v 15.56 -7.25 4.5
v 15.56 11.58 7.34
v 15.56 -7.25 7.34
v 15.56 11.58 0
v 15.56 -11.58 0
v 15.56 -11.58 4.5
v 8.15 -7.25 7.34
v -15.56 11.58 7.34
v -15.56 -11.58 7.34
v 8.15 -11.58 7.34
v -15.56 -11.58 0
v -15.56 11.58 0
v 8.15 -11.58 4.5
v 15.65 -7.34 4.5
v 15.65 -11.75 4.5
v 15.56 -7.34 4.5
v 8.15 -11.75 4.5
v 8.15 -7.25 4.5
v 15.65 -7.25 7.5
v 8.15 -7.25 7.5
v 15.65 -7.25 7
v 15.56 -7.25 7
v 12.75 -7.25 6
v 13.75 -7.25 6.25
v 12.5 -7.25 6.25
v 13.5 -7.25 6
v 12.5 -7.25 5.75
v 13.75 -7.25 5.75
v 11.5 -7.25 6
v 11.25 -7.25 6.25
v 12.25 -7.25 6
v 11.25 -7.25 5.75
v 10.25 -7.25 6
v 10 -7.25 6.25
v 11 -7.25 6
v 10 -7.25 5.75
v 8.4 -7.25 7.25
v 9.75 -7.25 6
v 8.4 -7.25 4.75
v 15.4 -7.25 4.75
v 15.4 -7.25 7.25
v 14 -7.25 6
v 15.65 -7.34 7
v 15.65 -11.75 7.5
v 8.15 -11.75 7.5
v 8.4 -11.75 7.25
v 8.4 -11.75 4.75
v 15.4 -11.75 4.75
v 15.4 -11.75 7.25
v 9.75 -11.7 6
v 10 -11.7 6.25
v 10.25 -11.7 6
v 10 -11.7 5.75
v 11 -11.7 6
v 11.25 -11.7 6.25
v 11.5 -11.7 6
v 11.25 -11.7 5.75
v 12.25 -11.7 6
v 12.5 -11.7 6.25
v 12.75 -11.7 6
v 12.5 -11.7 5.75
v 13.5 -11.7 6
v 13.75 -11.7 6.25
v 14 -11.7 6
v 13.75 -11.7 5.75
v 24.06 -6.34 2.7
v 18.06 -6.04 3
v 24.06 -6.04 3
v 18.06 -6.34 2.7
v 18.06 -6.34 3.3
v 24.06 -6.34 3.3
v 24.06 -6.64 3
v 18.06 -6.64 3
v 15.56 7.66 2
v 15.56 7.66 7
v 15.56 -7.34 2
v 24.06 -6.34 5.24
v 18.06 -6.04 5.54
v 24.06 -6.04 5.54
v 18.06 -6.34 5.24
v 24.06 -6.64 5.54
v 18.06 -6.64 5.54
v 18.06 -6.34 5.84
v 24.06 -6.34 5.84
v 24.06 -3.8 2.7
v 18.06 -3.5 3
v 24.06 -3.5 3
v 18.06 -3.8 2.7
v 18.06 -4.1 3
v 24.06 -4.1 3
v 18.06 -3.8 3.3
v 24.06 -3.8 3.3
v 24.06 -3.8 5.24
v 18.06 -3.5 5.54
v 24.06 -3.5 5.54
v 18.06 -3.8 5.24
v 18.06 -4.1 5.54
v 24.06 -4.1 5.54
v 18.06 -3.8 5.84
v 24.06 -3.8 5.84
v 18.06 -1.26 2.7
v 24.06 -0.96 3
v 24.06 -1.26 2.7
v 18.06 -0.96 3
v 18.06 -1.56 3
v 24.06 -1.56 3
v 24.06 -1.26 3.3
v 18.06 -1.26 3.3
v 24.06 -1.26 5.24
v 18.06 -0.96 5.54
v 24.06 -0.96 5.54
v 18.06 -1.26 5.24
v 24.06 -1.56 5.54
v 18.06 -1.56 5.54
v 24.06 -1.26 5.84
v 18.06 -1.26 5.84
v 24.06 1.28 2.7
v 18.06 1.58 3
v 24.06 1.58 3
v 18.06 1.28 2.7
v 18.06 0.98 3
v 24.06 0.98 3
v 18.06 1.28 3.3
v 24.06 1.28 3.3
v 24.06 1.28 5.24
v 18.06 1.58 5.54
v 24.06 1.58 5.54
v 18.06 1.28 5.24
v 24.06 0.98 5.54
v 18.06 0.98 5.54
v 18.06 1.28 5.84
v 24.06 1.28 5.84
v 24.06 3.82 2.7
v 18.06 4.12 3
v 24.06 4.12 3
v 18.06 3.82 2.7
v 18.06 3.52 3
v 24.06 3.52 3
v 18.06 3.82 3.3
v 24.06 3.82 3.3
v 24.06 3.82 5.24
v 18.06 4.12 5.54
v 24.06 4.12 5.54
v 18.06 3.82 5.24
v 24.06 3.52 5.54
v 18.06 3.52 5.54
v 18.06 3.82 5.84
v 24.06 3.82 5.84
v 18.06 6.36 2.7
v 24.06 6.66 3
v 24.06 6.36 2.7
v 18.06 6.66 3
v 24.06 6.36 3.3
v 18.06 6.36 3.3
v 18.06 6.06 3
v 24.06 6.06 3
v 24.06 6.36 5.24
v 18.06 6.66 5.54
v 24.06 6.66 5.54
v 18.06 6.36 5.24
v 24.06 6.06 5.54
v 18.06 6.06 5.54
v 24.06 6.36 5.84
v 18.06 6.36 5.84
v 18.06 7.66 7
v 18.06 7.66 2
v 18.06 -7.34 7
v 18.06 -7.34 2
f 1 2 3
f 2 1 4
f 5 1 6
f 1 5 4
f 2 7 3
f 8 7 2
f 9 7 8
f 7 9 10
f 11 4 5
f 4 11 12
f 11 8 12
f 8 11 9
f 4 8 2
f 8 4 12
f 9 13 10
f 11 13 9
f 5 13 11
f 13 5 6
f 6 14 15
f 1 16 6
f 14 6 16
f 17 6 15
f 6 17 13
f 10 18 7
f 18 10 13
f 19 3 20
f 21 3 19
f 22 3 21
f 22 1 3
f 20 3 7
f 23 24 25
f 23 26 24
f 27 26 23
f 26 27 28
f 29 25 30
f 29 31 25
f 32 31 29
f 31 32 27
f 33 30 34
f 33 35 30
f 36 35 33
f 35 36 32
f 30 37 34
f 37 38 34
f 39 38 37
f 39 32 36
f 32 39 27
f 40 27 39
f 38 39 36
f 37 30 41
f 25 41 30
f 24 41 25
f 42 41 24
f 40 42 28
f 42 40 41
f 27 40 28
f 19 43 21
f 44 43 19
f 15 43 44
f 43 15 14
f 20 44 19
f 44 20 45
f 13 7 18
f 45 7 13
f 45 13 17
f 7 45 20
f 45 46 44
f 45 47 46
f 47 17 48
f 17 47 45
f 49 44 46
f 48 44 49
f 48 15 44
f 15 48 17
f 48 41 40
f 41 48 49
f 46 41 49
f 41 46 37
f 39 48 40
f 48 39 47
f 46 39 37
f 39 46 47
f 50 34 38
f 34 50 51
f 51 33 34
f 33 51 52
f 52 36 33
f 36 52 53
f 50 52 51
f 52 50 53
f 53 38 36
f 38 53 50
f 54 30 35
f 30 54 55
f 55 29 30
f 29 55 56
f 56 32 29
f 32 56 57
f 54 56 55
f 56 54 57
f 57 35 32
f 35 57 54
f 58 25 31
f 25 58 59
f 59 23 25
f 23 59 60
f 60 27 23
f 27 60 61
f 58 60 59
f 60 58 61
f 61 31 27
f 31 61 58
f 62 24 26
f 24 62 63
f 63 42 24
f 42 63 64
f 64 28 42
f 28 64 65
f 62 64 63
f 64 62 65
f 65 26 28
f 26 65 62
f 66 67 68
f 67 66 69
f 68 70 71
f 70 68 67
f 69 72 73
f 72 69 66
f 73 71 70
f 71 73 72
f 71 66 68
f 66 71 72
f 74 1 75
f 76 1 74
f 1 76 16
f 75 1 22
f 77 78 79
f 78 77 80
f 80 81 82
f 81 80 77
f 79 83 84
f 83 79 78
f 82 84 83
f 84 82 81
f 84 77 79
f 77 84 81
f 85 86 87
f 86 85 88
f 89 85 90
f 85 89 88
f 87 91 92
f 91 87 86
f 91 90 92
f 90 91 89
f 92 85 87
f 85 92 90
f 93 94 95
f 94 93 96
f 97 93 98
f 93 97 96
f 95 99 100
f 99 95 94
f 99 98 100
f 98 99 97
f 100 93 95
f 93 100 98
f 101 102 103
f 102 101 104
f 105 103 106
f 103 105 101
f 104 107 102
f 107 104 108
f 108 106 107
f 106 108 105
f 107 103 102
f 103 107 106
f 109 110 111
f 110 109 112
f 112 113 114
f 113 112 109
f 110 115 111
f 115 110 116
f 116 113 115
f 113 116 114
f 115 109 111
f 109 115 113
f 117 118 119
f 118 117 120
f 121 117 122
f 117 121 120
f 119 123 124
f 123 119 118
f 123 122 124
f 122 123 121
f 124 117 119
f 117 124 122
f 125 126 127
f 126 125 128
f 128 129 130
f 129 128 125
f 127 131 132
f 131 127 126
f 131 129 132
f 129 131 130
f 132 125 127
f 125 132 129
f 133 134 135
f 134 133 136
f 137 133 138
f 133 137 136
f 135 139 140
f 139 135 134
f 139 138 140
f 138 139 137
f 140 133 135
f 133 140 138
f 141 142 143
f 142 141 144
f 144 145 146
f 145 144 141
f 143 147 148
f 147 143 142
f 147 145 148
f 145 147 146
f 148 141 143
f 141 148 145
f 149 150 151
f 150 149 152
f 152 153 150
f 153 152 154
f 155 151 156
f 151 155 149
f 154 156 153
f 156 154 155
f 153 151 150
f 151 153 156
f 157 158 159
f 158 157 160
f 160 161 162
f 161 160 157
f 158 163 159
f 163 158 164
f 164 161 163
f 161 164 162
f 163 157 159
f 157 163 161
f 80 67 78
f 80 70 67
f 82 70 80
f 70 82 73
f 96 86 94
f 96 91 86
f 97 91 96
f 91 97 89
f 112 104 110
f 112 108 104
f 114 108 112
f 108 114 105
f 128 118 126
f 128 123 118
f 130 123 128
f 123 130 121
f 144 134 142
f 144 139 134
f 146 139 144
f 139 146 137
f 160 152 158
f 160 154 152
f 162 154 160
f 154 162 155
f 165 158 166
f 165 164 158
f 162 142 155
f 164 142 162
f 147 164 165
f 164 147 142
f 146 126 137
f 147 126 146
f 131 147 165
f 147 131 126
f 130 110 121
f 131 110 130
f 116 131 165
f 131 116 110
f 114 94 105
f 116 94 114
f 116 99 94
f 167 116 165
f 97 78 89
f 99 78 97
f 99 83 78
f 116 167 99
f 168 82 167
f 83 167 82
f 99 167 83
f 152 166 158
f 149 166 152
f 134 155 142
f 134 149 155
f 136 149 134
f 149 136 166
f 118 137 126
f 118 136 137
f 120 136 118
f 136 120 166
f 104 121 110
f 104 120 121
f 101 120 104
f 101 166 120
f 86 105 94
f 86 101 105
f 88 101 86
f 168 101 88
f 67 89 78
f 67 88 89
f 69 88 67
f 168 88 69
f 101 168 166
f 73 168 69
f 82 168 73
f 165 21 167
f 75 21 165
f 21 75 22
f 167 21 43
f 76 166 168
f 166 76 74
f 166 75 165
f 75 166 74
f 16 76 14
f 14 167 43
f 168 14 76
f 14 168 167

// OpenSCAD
// frsky - a OpenSCAD 
// Copyright (C) 2015  Gerard Valade

// This program is free software: you can redistribute it and/or modify
// it under the terms of the GNU General Public License as published by
// the Free Software Foundation, either version 3 of the License, or
// (at your option) any later version.

// This program is distributed in the hope that it will be useful,
// but WITHOUT ANY WARRANTY; without even the implied warranty of
// MERCHANTABILITY or FITNESS FOR A PARTICULAR PURPOSE.  See the
// GNU General Public License for more details.

// You should have received a copy of the GNU General Public License
// along with this program.  If not, see <http://www.gnu.org/licenses/>.

module frskyD4R($fn = 4)
{
	module connector()
	{
		//translate([31.12/2, -3, 2.5]) color([0.9, 0.8, 0.2])
		color([0.2, 0.2, 0.2]) cube([2.5, 15, 5], center=false);
		translate([0, 1, 1]) color([0.9, 0.8, 0.2])
			for (y=[0:5]) {
				translate([0, y*2.54, 0]) rotate([0, 90, 0]) cylinder(d=.6, h=8.5);
				translate([0, y*2.54, 2.54]) rotate([0, 90, 0]) cylinder(d=.6, h=8.5);
			}
		
	}
	module telemetryPort()
	{
		color([0.9,0.9,0.9])
		difference() { 
			cube([7.5, 4.5, 3.0], center=true);
			cube([7, 5, 2.5], center=true);
		
		}
		color([0.9, 0.8, 0.2]) for (x=[0:3]) {
			translate([x*1.25-1.9, 2.8, 0]) rotate([90, 0, 0]) cylinder(d=.5, h=5);
		}
		
	}

	difference() {	
		translate([0, 0, 7.34/2]) color([0.4, 0.4, 0.4]) cube([31.12, 23.16, 7.34], center=true);
		translate([11.9, -9.5, 6.0]) 
				cube([7.5, 4.5, 3.0], center=true);
	}
	translate([11.9, -9.5, 6.0]) telemetryPort();	
	translate([31.12/2, -7.34, 2]) connector();

}

frskyD4R();
